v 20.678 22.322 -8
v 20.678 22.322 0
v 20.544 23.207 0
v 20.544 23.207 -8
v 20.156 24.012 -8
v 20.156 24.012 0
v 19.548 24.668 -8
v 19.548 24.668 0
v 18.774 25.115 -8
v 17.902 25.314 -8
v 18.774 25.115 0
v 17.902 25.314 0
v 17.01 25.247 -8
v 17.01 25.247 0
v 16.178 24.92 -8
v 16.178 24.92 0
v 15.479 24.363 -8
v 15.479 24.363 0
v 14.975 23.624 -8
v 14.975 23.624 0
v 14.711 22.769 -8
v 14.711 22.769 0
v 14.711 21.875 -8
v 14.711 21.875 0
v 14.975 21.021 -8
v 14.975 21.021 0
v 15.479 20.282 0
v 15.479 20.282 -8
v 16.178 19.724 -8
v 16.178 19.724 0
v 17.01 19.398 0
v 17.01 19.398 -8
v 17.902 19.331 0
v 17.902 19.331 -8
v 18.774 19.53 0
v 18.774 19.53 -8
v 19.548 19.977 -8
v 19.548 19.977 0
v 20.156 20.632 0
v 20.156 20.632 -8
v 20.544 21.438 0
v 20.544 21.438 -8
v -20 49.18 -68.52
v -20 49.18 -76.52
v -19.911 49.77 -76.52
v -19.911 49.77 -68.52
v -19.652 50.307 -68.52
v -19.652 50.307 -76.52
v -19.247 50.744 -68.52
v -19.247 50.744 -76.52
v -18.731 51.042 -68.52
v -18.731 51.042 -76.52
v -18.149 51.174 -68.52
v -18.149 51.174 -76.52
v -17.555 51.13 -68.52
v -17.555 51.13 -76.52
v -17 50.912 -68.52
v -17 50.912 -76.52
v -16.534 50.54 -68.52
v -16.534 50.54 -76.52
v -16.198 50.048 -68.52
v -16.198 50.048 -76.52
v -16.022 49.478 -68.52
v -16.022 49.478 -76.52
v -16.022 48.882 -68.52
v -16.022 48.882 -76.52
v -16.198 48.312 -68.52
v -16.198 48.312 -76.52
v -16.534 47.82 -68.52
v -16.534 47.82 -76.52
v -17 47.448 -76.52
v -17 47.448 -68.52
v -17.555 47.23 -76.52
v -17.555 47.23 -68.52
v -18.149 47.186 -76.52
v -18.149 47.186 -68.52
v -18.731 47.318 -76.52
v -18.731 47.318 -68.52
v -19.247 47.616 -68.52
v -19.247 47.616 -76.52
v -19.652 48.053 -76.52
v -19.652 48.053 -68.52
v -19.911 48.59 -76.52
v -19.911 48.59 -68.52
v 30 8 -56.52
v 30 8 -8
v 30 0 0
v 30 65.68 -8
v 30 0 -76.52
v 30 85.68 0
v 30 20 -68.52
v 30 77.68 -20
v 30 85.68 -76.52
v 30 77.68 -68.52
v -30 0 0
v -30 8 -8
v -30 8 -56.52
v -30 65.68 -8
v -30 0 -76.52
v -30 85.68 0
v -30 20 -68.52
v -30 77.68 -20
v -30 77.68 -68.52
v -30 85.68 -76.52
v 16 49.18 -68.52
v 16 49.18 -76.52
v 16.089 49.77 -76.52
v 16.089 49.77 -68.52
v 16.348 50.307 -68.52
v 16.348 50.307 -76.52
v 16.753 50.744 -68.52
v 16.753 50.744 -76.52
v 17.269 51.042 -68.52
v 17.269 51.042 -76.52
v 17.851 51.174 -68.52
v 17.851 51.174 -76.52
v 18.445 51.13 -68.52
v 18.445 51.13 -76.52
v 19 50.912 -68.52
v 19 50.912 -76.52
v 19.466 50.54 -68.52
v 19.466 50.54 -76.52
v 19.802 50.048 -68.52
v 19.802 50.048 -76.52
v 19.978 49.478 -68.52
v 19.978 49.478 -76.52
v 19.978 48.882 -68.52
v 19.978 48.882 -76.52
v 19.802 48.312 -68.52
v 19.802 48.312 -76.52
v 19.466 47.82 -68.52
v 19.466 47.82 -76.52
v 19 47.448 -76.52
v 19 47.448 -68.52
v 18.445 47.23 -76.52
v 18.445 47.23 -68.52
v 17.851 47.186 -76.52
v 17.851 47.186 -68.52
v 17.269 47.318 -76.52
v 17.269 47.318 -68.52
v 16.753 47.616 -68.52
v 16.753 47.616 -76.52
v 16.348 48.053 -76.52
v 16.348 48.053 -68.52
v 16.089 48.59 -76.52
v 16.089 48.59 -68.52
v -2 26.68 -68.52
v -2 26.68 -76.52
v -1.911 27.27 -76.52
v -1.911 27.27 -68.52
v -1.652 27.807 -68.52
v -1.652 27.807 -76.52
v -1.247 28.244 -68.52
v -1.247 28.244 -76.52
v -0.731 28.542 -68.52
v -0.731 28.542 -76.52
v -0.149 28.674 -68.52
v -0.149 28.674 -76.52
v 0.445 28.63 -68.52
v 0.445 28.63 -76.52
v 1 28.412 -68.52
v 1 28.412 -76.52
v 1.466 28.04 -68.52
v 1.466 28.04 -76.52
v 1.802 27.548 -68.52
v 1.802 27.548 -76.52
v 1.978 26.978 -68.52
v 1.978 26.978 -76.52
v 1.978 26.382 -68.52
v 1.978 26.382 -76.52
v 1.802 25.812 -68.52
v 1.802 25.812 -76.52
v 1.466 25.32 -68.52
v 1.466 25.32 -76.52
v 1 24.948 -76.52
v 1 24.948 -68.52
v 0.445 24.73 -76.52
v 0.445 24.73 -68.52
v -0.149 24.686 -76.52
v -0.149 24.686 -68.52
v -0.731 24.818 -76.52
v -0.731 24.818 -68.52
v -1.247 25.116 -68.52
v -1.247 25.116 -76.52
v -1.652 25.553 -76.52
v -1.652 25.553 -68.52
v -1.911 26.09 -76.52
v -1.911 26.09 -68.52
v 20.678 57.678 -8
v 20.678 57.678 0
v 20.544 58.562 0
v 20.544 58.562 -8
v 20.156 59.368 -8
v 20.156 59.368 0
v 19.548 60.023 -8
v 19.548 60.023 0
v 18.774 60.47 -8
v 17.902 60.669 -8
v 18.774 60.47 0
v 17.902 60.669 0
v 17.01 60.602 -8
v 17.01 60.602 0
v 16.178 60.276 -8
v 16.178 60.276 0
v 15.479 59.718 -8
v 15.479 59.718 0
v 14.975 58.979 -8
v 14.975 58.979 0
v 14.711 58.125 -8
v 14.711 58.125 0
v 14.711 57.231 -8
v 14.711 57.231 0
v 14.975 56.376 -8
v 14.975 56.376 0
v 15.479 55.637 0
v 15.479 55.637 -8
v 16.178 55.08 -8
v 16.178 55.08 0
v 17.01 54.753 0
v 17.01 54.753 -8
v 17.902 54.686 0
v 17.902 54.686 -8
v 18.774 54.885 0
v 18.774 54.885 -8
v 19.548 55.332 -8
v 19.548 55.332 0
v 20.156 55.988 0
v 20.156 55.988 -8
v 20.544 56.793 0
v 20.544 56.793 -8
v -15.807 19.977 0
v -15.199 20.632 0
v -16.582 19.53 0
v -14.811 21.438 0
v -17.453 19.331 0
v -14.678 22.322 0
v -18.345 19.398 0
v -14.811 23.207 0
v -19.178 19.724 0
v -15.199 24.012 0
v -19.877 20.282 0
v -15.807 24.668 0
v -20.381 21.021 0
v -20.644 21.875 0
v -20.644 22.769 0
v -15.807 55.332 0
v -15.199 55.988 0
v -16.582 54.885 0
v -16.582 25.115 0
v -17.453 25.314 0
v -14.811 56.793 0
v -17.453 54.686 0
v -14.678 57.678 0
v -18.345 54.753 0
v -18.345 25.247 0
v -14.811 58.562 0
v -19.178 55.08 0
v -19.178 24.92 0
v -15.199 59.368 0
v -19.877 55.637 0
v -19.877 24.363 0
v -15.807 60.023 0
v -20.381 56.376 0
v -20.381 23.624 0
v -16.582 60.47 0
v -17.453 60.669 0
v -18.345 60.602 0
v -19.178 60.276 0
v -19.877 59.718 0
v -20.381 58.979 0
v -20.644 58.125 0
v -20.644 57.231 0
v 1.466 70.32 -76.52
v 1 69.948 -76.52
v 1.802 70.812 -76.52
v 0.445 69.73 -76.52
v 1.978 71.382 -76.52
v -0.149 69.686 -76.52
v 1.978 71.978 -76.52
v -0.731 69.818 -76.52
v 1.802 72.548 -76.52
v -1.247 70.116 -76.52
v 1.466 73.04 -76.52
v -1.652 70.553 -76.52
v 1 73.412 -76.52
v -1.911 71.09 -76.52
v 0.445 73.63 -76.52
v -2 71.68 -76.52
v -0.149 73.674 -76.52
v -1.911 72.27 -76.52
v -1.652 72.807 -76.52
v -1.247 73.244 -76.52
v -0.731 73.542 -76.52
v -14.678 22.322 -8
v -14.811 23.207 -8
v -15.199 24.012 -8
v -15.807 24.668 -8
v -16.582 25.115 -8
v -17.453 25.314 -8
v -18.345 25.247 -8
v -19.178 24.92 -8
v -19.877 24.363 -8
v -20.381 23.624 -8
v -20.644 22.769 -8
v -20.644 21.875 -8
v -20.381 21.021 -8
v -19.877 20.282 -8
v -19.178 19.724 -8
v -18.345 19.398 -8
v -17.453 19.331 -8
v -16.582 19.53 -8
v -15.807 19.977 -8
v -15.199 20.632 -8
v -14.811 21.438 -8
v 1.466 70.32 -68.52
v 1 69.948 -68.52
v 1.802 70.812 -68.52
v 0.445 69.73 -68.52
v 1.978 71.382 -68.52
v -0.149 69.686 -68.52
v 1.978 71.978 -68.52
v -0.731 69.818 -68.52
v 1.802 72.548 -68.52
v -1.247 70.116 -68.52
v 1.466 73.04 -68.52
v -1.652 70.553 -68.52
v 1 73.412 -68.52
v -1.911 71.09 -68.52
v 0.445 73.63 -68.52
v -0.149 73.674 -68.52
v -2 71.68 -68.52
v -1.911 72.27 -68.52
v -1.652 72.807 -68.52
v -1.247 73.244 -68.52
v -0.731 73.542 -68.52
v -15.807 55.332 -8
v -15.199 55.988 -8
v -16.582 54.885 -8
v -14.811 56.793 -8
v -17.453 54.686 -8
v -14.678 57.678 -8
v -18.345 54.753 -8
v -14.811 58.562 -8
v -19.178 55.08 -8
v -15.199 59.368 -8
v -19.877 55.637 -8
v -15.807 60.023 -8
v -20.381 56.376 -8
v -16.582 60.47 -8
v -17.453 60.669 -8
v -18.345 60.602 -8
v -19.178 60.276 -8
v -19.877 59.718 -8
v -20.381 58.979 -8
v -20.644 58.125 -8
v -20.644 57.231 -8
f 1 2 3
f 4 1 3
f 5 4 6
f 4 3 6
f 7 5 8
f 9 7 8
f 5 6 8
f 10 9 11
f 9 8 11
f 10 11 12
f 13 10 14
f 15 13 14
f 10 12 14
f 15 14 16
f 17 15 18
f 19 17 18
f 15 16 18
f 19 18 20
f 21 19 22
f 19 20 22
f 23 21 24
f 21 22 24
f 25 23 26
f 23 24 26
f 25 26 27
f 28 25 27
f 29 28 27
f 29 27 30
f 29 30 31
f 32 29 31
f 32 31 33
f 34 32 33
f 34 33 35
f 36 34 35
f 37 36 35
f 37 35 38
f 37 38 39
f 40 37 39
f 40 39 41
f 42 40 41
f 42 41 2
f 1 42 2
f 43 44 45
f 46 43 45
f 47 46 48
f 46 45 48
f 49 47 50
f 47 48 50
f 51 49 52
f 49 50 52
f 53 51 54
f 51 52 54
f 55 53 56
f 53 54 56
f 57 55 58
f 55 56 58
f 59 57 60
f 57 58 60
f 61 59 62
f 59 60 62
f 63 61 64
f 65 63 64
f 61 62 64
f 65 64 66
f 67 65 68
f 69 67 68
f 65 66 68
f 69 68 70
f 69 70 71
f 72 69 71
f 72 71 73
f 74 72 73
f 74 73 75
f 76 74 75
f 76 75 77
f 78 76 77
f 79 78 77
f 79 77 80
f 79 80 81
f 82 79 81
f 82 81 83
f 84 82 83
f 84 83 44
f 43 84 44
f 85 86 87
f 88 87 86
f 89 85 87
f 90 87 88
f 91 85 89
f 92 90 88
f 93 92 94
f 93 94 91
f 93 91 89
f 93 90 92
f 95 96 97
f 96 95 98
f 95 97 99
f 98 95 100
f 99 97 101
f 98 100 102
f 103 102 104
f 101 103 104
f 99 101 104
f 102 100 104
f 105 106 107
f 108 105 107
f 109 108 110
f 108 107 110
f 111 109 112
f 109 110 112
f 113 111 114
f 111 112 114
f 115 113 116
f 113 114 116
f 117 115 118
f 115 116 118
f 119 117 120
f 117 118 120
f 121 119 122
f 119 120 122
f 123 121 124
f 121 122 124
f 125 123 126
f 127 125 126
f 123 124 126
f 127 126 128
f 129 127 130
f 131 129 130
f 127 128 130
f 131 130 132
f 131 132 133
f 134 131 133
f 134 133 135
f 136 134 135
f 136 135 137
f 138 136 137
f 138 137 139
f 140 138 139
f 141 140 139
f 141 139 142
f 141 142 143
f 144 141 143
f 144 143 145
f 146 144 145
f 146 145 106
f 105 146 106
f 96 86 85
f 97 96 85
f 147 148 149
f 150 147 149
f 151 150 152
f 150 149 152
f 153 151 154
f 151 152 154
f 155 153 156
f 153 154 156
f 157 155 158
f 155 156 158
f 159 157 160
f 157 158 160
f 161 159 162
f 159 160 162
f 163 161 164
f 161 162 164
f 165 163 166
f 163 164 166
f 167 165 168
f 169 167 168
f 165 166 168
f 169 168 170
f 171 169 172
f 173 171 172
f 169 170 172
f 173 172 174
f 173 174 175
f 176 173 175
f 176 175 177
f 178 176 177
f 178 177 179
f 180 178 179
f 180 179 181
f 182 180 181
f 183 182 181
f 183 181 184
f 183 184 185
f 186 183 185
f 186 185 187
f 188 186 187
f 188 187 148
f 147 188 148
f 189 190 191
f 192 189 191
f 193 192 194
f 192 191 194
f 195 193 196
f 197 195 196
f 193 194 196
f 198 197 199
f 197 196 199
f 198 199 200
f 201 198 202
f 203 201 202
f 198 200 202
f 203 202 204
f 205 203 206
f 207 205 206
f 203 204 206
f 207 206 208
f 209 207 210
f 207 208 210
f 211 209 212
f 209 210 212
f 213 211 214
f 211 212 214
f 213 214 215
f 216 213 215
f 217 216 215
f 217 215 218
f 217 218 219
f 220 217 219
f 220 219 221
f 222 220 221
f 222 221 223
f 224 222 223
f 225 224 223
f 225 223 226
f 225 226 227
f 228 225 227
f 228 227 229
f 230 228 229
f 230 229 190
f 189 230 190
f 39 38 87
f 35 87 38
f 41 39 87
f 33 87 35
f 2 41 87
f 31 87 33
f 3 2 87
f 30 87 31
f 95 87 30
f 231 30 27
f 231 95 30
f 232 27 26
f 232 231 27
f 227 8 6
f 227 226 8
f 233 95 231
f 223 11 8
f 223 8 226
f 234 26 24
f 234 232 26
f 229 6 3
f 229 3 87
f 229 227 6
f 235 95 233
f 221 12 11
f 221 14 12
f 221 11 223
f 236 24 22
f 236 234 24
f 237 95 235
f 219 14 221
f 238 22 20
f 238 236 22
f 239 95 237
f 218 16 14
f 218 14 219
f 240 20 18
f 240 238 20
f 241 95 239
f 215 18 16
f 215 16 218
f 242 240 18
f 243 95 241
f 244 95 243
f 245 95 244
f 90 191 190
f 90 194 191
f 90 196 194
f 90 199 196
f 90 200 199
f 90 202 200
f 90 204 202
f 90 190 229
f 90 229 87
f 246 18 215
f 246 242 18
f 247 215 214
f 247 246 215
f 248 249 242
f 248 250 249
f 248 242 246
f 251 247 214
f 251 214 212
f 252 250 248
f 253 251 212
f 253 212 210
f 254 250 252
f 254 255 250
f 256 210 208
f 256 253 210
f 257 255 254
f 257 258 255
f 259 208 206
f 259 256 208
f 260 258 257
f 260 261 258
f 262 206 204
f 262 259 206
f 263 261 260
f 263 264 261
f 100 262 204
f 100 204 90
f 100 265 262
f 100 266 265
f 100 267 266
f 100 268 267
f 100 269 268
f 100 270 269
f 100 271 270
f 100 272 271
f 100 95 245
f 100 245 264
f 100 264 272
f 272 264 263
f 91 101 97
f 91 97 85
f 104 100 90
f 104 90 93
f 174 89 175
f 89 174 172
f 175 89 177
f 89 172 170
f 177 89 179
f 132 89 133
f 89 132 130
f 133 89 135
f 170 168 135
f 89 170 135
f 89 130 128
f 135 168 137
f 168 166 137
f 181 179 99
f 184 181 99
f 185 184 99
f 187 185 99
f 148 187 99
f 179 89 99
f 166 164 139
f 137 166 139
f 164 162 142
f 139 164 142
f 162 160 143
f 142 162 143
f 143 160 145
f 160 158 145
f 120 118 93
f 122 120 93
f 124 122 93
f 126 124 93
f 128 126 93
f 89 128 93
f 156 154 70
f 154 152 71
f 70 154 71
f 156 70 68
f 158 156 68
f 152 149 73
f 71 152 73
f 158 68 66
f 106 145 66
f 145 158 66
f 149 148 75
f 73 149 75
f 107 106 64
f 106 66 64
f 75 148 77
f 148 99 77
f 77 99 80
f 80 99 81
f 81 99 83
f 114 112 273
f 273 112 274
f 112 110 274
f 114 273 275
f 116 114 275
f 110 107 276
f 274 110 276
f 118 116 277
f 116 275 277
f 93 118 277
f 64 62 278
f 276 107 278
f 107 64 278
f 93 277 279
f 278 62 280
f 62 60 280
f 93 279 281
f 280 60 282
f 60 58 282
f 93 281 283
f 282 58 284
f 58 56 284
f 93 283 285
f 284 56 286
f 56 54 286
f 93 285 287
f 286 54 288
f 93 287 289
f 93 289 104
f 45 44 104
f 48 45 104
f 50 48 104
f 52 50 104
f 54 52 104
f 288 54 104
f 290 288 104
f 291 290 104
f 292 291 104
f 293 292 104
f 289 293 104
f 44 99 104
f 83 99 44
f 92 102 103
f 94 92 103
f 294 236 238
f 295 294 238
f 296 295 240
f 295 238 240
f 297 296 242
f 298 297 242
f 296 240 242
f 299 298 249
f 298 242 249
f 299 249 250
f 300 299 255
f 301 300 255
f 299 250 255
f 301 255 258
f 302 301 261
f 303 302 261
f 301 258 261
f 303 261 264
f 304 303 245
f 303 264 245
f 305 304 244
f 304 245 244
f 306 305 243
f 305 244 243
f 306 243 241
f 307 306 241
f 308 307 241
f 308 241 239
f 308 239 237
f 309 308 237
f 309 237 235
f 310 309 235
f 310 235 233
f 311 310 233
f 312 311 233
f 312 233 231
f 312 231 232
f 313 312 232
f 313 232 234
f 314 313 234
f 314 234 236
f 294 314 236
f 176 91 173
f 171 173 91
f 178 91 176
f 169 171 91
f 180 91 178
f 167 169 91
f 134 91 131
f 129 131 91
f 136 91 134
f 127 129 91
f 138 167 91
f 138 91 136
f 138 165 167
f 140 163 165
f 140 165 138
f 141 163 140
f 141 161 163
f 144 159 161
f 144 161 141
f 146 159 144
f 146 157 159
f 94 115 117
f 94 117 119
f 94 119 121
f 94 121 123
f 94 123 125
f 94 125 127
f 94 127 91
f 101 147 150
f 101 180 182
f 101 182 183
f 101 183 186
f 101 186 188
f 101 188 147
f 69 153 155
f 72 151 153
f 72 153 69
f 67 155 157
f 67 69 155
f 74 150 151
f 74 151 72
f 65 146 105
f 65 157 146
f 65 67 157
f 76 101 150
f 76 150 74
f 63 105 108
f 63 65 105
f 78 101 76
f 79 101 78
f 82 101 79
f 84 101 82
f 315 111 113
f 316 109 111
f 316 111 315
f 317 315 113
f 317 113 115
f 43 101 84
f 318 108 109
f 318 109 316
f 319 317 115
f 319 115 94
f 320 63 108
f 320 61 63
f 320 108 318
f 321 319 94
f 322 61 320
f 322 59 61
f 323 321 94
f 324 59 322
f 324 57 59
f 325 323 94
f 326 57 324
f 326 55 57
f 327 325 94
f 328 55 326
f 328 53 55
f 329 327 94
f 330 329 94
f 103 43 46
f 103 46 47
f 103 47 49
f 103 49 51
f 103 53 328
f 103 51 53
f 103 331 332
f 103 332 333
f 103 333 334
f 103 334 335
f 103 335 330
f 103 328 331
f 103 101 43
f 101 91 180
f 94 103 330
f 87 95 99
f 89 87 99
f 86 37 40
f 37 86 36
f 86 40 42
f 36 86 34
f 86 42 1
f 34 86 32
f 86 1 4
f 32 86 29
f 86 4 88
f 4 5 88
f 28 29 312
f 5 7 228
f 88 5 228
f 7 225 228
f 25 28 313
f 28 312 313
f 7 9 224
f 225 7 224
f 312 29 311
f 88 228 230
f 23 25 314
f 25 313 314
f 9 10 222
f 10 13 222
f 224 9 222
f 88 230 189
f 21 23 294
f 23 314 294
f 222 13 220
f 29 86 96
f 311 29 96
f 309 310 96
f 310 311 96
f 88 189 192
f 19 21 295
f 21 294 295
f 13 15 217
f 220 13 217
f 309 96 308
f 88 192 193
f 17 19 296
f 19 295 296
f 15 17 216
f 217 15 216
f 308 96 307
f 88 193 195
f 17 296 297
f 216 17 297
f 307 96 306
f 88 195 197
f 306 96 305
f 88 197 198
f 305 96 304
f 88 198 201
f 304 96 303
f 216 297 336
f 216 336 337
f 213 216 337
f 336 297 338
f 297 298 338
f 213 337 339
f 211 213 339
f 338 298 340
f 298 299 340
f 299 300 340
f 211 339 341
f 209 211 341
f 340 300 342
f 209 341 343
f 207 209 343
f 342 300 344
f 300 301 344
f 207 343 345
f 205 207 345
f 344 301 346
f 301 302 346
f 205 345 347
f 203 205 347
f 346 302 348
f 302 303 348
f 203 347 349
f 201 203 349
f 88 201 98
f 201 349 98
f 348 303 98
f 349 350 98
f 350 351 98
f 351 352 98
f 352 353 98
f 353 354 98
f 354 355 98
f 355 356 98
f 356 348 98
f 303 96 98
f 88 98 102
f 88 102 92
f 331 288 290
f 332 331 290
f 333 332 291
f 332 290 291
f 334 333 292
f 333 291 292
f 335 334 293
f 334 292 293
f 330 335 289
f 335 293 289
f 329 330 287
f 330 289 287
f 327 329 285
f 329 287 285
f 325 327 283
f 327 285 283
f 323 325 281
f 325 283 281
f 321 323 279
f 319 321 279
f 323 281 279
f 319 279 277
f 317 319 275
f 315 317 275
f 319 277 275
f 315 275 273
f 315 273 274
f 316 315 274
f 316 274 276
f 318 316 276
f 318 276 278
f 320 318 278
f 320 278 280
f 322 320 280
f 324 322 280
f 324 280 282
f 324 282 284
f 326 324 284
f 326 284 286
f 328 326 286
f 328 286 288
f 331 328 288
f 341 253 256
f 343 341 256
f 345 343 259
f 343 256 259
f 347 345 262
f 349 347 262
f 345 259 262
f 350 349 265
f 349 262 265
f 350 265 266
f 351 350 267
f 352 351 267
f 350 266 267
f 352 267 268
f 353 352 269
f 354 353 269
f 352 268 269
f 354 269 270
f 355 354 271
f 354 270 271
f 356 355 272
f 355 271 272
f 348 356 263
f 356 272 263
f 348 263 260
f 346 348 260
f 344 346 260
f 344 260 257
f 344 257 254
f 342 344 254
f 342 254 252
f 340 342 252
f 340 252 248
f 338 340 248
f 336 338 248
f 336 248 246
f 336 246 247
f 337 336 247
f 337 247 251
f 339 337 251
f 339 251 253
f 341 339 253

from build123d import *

# Parameters (mm, degrees)
BOSS_EXTRUDE1_DEPTH      = 30
BOSS_EXTRUDE1_DEPTH_BACK = 30
SKETCH1_W                = 76.52
SKETCH1_H                = 85.68
SKETCH1_W_2              = 60.52
SKETCH1_H_2              = 69.68
SKETCH2_R                = 2
CUT_EXTRUDE1_DEPTH       = 30
SKETCH3_R                = 3
CUT_EXTRUDE2_DEPTH       = 30
CHAMFER1_SIZE            = 12


with BuildPart() as part:
    # Sketch1 → Boss-Extrude1 (new, two sides: drawn at the far end of the back side and taken through both)
    with BuildSketch(Plane(origin=(0, 0, 0), x_dir=(0, 0, -1), z_dir=(1, 0, 0)).offset(-BOSS_EXTRUDE1_DEPTH_BACK)):
        with Locations((38.26, 42.84)):
            Rectangle(SKETCH1_W, SKETCH1_H)
        with Locations((38.26, 42.84)):
            Rectangle(SKETCH1_W_2, SKETCH1_H_2, mode=Mode.SUBTRACT)
    extrude(amount=BOSS_EXTRUDE1_DEPTH + BOSS_EXTRUDE1_DEPTH_BACK)

    # Sketch2 → Cut-Extrude1 (cut)
    with BuildSketch(Plane(origin=(0, 0, -76.52), x_dir=(-1, 0, 0), z_dir=(0, 0, -1))):
        with Locations((0, 71.68)):
            Circle(SKETCH2_R)
        with Locations((18, 49.18)):
            Circle(SKETCH2_R)
        with Locations((-18, 49.18)):
            Circle(SKETCH2_R)
        with Locations((0, 26.68)):
            Circle(SKETCH2_R)
    extrude(amount=-CUT_EXTRUDE1_DEPTH, mode=Mode.SUBTRACT)

    # Sketch3 → Cut-Extrude2 (cut)
    with BuildSketch(Plane.XY):
        with Locations((17.67766953, 22.32233047)):
            Circle(SKETCH3_R)
        with Locations((-17.67766953, 22.32233047)):
            Circle(SKETCH3_R)
        with Locations((-17.67766953, 57.67766953)):
            Circle(SKETCH3_R)
        with Locations((17.67766953, 57.67766953)):
            Circle(SKETCH3_R)
    extrude(amount=-CUT_EXTRUDE2_DEPTH, mode=Mode.SUBTRACT)

    # Chamfer1
    chamfer1_edges = [part.edges().sort_by_distance(p)[0] for p in [
        (0, 77.68, -8),
        (0, 8, -68.52),
    ]]
    chamfer(chamfer1_edges, length=CHAMFER1_SIZE)


solid = part.part
